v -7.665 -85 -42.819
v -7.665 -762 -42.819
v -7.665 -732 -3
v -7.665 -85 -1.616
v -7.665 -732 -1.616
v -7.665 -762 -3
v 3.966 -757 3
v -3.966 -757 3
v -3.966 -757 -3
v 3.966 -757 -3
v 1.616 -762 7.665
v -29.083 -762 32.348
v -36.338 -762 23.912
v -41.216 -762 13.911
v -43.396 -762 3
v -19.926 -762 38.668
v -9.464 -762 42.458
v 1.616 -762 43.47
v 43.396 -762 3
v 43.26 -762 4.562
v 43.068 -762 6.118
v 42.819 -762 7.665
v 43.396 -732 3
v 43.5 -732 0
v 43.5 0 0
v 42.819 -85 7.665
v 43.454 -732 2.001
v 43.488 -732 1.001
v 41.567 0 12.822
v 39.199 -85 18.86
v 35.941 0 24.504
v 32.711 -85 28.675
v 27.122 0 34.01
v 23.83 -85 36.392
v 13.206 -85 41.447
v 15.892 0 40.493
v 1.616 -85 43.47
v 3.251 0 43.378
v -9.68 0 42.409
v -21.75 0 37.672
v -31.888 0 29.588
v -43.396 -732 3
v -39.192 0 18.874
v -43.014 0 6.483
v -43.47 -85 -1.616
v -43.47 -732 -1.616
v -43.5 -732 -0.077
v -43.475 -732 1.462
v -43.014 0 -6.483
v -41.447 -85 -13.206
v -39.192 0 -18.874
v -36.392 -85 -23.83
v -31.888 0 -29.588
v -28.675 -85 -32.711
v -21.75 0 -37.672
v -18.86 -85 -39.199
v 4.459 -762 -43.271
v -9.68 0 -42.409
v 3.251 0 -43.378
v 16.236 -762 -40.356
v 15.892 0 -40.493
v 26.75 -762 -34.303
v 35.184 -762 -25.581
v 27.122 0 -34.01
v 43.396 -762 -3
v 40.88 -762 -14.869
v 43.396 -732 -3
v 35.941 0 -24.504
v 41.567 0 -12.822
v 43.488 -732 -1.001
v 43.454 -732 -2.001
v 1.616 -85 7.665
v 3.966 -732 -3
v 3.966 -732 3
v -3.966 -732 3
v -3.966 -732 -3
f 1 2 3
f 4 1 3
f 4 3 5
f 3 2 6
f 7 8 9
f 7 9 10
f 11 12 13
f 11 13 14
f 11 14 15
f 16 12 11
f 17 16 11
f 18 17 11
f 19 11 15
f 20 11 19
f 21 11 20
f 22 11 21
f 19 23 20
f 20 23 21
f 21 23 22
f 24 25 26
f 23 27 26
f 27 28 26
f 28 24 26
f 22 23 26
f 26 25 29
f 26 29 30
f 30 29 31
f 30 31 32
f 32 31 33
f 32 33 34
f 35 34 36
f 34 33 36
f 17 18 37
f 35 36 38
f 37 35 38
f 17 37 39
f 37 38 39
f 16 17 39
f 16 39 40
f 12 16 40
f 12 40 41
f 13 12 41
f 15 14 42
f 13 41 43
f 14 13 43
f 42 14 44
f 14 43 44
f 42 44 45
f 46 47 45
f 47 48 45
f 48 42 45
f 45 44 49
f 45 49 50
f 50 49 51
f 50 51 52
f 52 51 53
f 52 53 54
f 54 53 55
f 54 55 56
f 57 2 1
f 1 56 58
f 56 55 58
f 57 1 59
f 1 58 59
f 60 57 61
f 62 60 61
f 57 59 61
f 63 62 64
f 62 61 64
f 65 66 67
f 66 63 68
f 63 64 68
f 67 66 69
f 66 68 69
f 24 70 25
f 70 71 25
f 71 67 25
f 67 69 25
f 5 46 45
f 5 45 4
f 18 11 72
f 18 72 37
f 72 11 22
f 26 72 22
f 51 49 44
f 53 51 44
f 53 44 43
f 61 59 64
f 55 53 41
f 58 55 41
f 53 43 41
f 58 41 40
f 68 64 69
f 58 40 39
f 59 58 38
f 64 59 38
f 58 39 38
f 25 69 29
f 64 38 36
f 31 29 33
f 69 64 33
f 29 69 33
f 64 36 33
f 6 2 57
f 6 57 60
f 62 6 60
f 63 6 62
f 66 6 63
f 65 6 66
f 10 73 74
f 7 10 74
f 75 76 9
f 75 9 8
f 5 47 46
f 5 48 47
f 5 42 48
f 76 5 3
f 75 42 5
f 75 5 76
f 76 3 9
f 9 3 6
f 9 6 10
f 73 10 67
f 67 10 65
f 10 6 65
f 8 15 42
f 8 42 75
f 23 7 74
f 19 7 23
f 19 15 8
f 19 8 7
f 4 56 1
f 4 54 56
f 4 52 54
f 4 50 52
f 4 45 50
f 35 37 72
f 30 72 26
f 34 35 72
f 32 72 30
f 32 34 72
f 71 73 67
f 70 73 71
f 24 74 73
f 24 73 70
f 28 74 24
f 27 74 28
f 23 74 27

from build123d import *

# Parameters (mm, degrees)
F0_R     = 43.5
F1_DEPTH = 762
F2_W     = 99
F2_H     = 6
F3_DEPTH = 30
F4_W     = 7.932048
F4_H     = 6
F5_DEPTH = 25
F6_W     = 43.600235
F6_H     = 52.118463
F6_W_2   = 52.118463
F6_H_2   = 43.600235
F7_DEPTH = 677


with BuildPart() as f1:
    # F0 (on Front) → F1 (new body)
    with BuildSketch(Plane.XZ):
        Circle(F0_R)
    extrude(amount=F1_DEPTH)

    # F2 (on face) → F3 (cut)
    with BuildSketch(Plane.XZ.offset(762)):
        Rectangle(F2_W, F2_H)
    extrude(amount=-F3_DEPTH, mode=Mode.SUBTRACT)

    # F4 (on face) → F5 (join)
    with BuildSketch(Plane.XZ.offset(732)):
        Rectangle(F4_W, F4_H)
    extrude(amount=F5_DEPTH)

    # F6 (on face) → F7 (cut)
    with BuildSketch(Plane.XZ.offset(762)):
        with Locations((23.416517, 33.724575)):
            Rectangle(F6_W, F6_H)
        with Locations((-33.724575, -23.416517)):
            Rectangle(F6_W_2, F6_H_2)
    extrude(amount=-F7_DEPTH, mode=Mode.SUBTRACT)


solid = f1.part
